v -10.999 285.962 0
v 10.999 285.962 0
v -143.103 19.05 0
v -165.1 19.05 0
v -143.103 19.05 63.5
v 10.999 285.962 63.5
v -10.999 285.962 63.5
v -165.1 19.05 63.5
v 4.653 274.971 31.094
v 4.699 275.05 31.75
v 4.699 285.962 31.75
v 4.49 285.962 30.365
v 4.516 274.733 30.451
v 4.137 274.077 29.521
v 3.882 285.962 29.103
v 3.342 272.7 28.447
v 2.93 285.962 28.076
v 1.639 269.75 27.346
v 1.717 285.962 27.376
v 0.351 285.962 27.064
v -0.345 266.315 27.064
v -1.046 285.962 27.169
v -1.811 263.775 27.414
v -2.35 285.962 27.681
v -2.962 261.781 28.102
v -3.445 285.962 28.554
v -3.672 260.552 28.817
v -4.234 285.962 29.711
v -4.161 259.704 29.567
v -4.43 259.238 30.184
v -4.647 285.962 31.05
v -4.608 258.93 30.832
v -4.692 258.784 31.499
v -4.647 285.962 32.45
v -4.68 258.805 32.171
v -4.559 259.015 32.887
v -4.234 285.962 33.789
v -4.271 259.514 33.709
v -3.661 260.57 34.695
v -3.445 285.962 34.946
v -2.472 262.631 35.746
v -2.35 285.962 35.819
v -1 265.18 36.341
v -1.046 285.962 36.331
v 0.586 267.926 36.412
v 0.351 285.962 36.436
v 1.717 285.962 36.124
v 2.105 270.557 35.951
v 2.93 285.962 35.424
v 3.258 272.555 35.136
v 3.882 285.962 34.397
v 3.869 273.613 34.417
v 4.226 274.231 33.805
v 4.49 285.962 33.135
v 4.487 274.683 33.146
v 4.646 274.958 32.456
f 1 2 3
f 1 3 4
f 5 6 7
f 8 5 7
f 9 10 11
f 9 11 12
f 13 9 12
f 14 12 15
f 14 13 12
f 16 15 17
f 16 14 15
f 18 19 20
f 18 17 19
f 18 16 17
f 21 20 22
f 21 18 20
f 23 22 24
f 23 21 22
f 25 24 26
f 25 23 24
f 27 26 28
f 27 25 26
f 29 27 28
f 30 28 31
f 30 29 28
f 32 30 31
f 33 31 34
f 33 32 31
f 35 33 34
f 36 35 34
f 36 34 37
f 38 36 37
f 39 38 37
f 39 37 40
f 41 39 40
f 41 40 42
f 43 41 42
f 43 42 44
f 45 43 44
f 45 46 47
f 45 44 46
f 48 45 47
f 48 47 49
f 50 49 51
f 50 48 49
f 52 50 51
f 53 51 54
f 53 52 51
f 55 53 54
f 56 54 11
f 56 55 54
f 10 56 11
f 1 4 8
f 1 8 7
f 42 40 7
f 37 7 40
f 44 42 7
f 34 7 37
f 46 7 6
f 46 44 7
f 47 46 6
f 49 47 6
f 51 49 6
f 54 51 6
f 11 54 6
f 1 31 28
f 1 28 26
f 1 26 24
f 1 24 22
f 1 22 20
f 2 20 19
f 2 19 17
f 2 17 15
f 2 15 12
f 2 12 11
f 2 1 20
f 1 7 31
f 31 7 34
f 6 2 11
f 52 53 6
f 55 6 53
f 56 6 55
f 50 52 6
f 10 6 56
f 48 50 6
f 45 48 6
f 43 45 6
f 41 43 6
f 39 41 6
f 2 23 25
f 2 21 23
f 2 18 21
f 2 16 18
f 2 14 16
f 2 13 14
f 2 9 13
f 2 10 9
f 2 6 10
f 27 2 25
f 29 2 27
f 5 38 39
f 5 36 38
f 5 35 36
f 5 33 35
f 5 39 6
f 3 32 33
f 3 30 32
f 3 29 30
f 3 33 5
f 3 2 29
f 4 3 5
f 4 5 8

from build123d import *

# Parameters (mm, degrees)
LEFT_EXT_DEPTH = 63.5
HOLE_R         = 4.699
HOLE_CUT_DEPTH = 286.961588331


with BuildPart() as part:
    # Left → left_ext (new body)
    with BuildSketch(Plane.XY):
        Polygon((-165.1, 19.05), (-10.998522627, 285.961588331), (10.998522629, 285.961588331), (-143.102954744, 19.05), align=None)
    extrude(amount=LEFT_EXT_DEPTH)

    # hole → hole_cut (cut, through all)
    with BuildSketch(Plane(origin=(0, 0, 0), x_dir=(1, 0, 0), z_dir=(0, 1, 0))):
        with Locations((0, -31.75)):
            Circle(HOLE_R)
    extrude(amount=HOLE_CUT_DEPTH, mode=Mode.SUBTRACT)


solid = part.part
